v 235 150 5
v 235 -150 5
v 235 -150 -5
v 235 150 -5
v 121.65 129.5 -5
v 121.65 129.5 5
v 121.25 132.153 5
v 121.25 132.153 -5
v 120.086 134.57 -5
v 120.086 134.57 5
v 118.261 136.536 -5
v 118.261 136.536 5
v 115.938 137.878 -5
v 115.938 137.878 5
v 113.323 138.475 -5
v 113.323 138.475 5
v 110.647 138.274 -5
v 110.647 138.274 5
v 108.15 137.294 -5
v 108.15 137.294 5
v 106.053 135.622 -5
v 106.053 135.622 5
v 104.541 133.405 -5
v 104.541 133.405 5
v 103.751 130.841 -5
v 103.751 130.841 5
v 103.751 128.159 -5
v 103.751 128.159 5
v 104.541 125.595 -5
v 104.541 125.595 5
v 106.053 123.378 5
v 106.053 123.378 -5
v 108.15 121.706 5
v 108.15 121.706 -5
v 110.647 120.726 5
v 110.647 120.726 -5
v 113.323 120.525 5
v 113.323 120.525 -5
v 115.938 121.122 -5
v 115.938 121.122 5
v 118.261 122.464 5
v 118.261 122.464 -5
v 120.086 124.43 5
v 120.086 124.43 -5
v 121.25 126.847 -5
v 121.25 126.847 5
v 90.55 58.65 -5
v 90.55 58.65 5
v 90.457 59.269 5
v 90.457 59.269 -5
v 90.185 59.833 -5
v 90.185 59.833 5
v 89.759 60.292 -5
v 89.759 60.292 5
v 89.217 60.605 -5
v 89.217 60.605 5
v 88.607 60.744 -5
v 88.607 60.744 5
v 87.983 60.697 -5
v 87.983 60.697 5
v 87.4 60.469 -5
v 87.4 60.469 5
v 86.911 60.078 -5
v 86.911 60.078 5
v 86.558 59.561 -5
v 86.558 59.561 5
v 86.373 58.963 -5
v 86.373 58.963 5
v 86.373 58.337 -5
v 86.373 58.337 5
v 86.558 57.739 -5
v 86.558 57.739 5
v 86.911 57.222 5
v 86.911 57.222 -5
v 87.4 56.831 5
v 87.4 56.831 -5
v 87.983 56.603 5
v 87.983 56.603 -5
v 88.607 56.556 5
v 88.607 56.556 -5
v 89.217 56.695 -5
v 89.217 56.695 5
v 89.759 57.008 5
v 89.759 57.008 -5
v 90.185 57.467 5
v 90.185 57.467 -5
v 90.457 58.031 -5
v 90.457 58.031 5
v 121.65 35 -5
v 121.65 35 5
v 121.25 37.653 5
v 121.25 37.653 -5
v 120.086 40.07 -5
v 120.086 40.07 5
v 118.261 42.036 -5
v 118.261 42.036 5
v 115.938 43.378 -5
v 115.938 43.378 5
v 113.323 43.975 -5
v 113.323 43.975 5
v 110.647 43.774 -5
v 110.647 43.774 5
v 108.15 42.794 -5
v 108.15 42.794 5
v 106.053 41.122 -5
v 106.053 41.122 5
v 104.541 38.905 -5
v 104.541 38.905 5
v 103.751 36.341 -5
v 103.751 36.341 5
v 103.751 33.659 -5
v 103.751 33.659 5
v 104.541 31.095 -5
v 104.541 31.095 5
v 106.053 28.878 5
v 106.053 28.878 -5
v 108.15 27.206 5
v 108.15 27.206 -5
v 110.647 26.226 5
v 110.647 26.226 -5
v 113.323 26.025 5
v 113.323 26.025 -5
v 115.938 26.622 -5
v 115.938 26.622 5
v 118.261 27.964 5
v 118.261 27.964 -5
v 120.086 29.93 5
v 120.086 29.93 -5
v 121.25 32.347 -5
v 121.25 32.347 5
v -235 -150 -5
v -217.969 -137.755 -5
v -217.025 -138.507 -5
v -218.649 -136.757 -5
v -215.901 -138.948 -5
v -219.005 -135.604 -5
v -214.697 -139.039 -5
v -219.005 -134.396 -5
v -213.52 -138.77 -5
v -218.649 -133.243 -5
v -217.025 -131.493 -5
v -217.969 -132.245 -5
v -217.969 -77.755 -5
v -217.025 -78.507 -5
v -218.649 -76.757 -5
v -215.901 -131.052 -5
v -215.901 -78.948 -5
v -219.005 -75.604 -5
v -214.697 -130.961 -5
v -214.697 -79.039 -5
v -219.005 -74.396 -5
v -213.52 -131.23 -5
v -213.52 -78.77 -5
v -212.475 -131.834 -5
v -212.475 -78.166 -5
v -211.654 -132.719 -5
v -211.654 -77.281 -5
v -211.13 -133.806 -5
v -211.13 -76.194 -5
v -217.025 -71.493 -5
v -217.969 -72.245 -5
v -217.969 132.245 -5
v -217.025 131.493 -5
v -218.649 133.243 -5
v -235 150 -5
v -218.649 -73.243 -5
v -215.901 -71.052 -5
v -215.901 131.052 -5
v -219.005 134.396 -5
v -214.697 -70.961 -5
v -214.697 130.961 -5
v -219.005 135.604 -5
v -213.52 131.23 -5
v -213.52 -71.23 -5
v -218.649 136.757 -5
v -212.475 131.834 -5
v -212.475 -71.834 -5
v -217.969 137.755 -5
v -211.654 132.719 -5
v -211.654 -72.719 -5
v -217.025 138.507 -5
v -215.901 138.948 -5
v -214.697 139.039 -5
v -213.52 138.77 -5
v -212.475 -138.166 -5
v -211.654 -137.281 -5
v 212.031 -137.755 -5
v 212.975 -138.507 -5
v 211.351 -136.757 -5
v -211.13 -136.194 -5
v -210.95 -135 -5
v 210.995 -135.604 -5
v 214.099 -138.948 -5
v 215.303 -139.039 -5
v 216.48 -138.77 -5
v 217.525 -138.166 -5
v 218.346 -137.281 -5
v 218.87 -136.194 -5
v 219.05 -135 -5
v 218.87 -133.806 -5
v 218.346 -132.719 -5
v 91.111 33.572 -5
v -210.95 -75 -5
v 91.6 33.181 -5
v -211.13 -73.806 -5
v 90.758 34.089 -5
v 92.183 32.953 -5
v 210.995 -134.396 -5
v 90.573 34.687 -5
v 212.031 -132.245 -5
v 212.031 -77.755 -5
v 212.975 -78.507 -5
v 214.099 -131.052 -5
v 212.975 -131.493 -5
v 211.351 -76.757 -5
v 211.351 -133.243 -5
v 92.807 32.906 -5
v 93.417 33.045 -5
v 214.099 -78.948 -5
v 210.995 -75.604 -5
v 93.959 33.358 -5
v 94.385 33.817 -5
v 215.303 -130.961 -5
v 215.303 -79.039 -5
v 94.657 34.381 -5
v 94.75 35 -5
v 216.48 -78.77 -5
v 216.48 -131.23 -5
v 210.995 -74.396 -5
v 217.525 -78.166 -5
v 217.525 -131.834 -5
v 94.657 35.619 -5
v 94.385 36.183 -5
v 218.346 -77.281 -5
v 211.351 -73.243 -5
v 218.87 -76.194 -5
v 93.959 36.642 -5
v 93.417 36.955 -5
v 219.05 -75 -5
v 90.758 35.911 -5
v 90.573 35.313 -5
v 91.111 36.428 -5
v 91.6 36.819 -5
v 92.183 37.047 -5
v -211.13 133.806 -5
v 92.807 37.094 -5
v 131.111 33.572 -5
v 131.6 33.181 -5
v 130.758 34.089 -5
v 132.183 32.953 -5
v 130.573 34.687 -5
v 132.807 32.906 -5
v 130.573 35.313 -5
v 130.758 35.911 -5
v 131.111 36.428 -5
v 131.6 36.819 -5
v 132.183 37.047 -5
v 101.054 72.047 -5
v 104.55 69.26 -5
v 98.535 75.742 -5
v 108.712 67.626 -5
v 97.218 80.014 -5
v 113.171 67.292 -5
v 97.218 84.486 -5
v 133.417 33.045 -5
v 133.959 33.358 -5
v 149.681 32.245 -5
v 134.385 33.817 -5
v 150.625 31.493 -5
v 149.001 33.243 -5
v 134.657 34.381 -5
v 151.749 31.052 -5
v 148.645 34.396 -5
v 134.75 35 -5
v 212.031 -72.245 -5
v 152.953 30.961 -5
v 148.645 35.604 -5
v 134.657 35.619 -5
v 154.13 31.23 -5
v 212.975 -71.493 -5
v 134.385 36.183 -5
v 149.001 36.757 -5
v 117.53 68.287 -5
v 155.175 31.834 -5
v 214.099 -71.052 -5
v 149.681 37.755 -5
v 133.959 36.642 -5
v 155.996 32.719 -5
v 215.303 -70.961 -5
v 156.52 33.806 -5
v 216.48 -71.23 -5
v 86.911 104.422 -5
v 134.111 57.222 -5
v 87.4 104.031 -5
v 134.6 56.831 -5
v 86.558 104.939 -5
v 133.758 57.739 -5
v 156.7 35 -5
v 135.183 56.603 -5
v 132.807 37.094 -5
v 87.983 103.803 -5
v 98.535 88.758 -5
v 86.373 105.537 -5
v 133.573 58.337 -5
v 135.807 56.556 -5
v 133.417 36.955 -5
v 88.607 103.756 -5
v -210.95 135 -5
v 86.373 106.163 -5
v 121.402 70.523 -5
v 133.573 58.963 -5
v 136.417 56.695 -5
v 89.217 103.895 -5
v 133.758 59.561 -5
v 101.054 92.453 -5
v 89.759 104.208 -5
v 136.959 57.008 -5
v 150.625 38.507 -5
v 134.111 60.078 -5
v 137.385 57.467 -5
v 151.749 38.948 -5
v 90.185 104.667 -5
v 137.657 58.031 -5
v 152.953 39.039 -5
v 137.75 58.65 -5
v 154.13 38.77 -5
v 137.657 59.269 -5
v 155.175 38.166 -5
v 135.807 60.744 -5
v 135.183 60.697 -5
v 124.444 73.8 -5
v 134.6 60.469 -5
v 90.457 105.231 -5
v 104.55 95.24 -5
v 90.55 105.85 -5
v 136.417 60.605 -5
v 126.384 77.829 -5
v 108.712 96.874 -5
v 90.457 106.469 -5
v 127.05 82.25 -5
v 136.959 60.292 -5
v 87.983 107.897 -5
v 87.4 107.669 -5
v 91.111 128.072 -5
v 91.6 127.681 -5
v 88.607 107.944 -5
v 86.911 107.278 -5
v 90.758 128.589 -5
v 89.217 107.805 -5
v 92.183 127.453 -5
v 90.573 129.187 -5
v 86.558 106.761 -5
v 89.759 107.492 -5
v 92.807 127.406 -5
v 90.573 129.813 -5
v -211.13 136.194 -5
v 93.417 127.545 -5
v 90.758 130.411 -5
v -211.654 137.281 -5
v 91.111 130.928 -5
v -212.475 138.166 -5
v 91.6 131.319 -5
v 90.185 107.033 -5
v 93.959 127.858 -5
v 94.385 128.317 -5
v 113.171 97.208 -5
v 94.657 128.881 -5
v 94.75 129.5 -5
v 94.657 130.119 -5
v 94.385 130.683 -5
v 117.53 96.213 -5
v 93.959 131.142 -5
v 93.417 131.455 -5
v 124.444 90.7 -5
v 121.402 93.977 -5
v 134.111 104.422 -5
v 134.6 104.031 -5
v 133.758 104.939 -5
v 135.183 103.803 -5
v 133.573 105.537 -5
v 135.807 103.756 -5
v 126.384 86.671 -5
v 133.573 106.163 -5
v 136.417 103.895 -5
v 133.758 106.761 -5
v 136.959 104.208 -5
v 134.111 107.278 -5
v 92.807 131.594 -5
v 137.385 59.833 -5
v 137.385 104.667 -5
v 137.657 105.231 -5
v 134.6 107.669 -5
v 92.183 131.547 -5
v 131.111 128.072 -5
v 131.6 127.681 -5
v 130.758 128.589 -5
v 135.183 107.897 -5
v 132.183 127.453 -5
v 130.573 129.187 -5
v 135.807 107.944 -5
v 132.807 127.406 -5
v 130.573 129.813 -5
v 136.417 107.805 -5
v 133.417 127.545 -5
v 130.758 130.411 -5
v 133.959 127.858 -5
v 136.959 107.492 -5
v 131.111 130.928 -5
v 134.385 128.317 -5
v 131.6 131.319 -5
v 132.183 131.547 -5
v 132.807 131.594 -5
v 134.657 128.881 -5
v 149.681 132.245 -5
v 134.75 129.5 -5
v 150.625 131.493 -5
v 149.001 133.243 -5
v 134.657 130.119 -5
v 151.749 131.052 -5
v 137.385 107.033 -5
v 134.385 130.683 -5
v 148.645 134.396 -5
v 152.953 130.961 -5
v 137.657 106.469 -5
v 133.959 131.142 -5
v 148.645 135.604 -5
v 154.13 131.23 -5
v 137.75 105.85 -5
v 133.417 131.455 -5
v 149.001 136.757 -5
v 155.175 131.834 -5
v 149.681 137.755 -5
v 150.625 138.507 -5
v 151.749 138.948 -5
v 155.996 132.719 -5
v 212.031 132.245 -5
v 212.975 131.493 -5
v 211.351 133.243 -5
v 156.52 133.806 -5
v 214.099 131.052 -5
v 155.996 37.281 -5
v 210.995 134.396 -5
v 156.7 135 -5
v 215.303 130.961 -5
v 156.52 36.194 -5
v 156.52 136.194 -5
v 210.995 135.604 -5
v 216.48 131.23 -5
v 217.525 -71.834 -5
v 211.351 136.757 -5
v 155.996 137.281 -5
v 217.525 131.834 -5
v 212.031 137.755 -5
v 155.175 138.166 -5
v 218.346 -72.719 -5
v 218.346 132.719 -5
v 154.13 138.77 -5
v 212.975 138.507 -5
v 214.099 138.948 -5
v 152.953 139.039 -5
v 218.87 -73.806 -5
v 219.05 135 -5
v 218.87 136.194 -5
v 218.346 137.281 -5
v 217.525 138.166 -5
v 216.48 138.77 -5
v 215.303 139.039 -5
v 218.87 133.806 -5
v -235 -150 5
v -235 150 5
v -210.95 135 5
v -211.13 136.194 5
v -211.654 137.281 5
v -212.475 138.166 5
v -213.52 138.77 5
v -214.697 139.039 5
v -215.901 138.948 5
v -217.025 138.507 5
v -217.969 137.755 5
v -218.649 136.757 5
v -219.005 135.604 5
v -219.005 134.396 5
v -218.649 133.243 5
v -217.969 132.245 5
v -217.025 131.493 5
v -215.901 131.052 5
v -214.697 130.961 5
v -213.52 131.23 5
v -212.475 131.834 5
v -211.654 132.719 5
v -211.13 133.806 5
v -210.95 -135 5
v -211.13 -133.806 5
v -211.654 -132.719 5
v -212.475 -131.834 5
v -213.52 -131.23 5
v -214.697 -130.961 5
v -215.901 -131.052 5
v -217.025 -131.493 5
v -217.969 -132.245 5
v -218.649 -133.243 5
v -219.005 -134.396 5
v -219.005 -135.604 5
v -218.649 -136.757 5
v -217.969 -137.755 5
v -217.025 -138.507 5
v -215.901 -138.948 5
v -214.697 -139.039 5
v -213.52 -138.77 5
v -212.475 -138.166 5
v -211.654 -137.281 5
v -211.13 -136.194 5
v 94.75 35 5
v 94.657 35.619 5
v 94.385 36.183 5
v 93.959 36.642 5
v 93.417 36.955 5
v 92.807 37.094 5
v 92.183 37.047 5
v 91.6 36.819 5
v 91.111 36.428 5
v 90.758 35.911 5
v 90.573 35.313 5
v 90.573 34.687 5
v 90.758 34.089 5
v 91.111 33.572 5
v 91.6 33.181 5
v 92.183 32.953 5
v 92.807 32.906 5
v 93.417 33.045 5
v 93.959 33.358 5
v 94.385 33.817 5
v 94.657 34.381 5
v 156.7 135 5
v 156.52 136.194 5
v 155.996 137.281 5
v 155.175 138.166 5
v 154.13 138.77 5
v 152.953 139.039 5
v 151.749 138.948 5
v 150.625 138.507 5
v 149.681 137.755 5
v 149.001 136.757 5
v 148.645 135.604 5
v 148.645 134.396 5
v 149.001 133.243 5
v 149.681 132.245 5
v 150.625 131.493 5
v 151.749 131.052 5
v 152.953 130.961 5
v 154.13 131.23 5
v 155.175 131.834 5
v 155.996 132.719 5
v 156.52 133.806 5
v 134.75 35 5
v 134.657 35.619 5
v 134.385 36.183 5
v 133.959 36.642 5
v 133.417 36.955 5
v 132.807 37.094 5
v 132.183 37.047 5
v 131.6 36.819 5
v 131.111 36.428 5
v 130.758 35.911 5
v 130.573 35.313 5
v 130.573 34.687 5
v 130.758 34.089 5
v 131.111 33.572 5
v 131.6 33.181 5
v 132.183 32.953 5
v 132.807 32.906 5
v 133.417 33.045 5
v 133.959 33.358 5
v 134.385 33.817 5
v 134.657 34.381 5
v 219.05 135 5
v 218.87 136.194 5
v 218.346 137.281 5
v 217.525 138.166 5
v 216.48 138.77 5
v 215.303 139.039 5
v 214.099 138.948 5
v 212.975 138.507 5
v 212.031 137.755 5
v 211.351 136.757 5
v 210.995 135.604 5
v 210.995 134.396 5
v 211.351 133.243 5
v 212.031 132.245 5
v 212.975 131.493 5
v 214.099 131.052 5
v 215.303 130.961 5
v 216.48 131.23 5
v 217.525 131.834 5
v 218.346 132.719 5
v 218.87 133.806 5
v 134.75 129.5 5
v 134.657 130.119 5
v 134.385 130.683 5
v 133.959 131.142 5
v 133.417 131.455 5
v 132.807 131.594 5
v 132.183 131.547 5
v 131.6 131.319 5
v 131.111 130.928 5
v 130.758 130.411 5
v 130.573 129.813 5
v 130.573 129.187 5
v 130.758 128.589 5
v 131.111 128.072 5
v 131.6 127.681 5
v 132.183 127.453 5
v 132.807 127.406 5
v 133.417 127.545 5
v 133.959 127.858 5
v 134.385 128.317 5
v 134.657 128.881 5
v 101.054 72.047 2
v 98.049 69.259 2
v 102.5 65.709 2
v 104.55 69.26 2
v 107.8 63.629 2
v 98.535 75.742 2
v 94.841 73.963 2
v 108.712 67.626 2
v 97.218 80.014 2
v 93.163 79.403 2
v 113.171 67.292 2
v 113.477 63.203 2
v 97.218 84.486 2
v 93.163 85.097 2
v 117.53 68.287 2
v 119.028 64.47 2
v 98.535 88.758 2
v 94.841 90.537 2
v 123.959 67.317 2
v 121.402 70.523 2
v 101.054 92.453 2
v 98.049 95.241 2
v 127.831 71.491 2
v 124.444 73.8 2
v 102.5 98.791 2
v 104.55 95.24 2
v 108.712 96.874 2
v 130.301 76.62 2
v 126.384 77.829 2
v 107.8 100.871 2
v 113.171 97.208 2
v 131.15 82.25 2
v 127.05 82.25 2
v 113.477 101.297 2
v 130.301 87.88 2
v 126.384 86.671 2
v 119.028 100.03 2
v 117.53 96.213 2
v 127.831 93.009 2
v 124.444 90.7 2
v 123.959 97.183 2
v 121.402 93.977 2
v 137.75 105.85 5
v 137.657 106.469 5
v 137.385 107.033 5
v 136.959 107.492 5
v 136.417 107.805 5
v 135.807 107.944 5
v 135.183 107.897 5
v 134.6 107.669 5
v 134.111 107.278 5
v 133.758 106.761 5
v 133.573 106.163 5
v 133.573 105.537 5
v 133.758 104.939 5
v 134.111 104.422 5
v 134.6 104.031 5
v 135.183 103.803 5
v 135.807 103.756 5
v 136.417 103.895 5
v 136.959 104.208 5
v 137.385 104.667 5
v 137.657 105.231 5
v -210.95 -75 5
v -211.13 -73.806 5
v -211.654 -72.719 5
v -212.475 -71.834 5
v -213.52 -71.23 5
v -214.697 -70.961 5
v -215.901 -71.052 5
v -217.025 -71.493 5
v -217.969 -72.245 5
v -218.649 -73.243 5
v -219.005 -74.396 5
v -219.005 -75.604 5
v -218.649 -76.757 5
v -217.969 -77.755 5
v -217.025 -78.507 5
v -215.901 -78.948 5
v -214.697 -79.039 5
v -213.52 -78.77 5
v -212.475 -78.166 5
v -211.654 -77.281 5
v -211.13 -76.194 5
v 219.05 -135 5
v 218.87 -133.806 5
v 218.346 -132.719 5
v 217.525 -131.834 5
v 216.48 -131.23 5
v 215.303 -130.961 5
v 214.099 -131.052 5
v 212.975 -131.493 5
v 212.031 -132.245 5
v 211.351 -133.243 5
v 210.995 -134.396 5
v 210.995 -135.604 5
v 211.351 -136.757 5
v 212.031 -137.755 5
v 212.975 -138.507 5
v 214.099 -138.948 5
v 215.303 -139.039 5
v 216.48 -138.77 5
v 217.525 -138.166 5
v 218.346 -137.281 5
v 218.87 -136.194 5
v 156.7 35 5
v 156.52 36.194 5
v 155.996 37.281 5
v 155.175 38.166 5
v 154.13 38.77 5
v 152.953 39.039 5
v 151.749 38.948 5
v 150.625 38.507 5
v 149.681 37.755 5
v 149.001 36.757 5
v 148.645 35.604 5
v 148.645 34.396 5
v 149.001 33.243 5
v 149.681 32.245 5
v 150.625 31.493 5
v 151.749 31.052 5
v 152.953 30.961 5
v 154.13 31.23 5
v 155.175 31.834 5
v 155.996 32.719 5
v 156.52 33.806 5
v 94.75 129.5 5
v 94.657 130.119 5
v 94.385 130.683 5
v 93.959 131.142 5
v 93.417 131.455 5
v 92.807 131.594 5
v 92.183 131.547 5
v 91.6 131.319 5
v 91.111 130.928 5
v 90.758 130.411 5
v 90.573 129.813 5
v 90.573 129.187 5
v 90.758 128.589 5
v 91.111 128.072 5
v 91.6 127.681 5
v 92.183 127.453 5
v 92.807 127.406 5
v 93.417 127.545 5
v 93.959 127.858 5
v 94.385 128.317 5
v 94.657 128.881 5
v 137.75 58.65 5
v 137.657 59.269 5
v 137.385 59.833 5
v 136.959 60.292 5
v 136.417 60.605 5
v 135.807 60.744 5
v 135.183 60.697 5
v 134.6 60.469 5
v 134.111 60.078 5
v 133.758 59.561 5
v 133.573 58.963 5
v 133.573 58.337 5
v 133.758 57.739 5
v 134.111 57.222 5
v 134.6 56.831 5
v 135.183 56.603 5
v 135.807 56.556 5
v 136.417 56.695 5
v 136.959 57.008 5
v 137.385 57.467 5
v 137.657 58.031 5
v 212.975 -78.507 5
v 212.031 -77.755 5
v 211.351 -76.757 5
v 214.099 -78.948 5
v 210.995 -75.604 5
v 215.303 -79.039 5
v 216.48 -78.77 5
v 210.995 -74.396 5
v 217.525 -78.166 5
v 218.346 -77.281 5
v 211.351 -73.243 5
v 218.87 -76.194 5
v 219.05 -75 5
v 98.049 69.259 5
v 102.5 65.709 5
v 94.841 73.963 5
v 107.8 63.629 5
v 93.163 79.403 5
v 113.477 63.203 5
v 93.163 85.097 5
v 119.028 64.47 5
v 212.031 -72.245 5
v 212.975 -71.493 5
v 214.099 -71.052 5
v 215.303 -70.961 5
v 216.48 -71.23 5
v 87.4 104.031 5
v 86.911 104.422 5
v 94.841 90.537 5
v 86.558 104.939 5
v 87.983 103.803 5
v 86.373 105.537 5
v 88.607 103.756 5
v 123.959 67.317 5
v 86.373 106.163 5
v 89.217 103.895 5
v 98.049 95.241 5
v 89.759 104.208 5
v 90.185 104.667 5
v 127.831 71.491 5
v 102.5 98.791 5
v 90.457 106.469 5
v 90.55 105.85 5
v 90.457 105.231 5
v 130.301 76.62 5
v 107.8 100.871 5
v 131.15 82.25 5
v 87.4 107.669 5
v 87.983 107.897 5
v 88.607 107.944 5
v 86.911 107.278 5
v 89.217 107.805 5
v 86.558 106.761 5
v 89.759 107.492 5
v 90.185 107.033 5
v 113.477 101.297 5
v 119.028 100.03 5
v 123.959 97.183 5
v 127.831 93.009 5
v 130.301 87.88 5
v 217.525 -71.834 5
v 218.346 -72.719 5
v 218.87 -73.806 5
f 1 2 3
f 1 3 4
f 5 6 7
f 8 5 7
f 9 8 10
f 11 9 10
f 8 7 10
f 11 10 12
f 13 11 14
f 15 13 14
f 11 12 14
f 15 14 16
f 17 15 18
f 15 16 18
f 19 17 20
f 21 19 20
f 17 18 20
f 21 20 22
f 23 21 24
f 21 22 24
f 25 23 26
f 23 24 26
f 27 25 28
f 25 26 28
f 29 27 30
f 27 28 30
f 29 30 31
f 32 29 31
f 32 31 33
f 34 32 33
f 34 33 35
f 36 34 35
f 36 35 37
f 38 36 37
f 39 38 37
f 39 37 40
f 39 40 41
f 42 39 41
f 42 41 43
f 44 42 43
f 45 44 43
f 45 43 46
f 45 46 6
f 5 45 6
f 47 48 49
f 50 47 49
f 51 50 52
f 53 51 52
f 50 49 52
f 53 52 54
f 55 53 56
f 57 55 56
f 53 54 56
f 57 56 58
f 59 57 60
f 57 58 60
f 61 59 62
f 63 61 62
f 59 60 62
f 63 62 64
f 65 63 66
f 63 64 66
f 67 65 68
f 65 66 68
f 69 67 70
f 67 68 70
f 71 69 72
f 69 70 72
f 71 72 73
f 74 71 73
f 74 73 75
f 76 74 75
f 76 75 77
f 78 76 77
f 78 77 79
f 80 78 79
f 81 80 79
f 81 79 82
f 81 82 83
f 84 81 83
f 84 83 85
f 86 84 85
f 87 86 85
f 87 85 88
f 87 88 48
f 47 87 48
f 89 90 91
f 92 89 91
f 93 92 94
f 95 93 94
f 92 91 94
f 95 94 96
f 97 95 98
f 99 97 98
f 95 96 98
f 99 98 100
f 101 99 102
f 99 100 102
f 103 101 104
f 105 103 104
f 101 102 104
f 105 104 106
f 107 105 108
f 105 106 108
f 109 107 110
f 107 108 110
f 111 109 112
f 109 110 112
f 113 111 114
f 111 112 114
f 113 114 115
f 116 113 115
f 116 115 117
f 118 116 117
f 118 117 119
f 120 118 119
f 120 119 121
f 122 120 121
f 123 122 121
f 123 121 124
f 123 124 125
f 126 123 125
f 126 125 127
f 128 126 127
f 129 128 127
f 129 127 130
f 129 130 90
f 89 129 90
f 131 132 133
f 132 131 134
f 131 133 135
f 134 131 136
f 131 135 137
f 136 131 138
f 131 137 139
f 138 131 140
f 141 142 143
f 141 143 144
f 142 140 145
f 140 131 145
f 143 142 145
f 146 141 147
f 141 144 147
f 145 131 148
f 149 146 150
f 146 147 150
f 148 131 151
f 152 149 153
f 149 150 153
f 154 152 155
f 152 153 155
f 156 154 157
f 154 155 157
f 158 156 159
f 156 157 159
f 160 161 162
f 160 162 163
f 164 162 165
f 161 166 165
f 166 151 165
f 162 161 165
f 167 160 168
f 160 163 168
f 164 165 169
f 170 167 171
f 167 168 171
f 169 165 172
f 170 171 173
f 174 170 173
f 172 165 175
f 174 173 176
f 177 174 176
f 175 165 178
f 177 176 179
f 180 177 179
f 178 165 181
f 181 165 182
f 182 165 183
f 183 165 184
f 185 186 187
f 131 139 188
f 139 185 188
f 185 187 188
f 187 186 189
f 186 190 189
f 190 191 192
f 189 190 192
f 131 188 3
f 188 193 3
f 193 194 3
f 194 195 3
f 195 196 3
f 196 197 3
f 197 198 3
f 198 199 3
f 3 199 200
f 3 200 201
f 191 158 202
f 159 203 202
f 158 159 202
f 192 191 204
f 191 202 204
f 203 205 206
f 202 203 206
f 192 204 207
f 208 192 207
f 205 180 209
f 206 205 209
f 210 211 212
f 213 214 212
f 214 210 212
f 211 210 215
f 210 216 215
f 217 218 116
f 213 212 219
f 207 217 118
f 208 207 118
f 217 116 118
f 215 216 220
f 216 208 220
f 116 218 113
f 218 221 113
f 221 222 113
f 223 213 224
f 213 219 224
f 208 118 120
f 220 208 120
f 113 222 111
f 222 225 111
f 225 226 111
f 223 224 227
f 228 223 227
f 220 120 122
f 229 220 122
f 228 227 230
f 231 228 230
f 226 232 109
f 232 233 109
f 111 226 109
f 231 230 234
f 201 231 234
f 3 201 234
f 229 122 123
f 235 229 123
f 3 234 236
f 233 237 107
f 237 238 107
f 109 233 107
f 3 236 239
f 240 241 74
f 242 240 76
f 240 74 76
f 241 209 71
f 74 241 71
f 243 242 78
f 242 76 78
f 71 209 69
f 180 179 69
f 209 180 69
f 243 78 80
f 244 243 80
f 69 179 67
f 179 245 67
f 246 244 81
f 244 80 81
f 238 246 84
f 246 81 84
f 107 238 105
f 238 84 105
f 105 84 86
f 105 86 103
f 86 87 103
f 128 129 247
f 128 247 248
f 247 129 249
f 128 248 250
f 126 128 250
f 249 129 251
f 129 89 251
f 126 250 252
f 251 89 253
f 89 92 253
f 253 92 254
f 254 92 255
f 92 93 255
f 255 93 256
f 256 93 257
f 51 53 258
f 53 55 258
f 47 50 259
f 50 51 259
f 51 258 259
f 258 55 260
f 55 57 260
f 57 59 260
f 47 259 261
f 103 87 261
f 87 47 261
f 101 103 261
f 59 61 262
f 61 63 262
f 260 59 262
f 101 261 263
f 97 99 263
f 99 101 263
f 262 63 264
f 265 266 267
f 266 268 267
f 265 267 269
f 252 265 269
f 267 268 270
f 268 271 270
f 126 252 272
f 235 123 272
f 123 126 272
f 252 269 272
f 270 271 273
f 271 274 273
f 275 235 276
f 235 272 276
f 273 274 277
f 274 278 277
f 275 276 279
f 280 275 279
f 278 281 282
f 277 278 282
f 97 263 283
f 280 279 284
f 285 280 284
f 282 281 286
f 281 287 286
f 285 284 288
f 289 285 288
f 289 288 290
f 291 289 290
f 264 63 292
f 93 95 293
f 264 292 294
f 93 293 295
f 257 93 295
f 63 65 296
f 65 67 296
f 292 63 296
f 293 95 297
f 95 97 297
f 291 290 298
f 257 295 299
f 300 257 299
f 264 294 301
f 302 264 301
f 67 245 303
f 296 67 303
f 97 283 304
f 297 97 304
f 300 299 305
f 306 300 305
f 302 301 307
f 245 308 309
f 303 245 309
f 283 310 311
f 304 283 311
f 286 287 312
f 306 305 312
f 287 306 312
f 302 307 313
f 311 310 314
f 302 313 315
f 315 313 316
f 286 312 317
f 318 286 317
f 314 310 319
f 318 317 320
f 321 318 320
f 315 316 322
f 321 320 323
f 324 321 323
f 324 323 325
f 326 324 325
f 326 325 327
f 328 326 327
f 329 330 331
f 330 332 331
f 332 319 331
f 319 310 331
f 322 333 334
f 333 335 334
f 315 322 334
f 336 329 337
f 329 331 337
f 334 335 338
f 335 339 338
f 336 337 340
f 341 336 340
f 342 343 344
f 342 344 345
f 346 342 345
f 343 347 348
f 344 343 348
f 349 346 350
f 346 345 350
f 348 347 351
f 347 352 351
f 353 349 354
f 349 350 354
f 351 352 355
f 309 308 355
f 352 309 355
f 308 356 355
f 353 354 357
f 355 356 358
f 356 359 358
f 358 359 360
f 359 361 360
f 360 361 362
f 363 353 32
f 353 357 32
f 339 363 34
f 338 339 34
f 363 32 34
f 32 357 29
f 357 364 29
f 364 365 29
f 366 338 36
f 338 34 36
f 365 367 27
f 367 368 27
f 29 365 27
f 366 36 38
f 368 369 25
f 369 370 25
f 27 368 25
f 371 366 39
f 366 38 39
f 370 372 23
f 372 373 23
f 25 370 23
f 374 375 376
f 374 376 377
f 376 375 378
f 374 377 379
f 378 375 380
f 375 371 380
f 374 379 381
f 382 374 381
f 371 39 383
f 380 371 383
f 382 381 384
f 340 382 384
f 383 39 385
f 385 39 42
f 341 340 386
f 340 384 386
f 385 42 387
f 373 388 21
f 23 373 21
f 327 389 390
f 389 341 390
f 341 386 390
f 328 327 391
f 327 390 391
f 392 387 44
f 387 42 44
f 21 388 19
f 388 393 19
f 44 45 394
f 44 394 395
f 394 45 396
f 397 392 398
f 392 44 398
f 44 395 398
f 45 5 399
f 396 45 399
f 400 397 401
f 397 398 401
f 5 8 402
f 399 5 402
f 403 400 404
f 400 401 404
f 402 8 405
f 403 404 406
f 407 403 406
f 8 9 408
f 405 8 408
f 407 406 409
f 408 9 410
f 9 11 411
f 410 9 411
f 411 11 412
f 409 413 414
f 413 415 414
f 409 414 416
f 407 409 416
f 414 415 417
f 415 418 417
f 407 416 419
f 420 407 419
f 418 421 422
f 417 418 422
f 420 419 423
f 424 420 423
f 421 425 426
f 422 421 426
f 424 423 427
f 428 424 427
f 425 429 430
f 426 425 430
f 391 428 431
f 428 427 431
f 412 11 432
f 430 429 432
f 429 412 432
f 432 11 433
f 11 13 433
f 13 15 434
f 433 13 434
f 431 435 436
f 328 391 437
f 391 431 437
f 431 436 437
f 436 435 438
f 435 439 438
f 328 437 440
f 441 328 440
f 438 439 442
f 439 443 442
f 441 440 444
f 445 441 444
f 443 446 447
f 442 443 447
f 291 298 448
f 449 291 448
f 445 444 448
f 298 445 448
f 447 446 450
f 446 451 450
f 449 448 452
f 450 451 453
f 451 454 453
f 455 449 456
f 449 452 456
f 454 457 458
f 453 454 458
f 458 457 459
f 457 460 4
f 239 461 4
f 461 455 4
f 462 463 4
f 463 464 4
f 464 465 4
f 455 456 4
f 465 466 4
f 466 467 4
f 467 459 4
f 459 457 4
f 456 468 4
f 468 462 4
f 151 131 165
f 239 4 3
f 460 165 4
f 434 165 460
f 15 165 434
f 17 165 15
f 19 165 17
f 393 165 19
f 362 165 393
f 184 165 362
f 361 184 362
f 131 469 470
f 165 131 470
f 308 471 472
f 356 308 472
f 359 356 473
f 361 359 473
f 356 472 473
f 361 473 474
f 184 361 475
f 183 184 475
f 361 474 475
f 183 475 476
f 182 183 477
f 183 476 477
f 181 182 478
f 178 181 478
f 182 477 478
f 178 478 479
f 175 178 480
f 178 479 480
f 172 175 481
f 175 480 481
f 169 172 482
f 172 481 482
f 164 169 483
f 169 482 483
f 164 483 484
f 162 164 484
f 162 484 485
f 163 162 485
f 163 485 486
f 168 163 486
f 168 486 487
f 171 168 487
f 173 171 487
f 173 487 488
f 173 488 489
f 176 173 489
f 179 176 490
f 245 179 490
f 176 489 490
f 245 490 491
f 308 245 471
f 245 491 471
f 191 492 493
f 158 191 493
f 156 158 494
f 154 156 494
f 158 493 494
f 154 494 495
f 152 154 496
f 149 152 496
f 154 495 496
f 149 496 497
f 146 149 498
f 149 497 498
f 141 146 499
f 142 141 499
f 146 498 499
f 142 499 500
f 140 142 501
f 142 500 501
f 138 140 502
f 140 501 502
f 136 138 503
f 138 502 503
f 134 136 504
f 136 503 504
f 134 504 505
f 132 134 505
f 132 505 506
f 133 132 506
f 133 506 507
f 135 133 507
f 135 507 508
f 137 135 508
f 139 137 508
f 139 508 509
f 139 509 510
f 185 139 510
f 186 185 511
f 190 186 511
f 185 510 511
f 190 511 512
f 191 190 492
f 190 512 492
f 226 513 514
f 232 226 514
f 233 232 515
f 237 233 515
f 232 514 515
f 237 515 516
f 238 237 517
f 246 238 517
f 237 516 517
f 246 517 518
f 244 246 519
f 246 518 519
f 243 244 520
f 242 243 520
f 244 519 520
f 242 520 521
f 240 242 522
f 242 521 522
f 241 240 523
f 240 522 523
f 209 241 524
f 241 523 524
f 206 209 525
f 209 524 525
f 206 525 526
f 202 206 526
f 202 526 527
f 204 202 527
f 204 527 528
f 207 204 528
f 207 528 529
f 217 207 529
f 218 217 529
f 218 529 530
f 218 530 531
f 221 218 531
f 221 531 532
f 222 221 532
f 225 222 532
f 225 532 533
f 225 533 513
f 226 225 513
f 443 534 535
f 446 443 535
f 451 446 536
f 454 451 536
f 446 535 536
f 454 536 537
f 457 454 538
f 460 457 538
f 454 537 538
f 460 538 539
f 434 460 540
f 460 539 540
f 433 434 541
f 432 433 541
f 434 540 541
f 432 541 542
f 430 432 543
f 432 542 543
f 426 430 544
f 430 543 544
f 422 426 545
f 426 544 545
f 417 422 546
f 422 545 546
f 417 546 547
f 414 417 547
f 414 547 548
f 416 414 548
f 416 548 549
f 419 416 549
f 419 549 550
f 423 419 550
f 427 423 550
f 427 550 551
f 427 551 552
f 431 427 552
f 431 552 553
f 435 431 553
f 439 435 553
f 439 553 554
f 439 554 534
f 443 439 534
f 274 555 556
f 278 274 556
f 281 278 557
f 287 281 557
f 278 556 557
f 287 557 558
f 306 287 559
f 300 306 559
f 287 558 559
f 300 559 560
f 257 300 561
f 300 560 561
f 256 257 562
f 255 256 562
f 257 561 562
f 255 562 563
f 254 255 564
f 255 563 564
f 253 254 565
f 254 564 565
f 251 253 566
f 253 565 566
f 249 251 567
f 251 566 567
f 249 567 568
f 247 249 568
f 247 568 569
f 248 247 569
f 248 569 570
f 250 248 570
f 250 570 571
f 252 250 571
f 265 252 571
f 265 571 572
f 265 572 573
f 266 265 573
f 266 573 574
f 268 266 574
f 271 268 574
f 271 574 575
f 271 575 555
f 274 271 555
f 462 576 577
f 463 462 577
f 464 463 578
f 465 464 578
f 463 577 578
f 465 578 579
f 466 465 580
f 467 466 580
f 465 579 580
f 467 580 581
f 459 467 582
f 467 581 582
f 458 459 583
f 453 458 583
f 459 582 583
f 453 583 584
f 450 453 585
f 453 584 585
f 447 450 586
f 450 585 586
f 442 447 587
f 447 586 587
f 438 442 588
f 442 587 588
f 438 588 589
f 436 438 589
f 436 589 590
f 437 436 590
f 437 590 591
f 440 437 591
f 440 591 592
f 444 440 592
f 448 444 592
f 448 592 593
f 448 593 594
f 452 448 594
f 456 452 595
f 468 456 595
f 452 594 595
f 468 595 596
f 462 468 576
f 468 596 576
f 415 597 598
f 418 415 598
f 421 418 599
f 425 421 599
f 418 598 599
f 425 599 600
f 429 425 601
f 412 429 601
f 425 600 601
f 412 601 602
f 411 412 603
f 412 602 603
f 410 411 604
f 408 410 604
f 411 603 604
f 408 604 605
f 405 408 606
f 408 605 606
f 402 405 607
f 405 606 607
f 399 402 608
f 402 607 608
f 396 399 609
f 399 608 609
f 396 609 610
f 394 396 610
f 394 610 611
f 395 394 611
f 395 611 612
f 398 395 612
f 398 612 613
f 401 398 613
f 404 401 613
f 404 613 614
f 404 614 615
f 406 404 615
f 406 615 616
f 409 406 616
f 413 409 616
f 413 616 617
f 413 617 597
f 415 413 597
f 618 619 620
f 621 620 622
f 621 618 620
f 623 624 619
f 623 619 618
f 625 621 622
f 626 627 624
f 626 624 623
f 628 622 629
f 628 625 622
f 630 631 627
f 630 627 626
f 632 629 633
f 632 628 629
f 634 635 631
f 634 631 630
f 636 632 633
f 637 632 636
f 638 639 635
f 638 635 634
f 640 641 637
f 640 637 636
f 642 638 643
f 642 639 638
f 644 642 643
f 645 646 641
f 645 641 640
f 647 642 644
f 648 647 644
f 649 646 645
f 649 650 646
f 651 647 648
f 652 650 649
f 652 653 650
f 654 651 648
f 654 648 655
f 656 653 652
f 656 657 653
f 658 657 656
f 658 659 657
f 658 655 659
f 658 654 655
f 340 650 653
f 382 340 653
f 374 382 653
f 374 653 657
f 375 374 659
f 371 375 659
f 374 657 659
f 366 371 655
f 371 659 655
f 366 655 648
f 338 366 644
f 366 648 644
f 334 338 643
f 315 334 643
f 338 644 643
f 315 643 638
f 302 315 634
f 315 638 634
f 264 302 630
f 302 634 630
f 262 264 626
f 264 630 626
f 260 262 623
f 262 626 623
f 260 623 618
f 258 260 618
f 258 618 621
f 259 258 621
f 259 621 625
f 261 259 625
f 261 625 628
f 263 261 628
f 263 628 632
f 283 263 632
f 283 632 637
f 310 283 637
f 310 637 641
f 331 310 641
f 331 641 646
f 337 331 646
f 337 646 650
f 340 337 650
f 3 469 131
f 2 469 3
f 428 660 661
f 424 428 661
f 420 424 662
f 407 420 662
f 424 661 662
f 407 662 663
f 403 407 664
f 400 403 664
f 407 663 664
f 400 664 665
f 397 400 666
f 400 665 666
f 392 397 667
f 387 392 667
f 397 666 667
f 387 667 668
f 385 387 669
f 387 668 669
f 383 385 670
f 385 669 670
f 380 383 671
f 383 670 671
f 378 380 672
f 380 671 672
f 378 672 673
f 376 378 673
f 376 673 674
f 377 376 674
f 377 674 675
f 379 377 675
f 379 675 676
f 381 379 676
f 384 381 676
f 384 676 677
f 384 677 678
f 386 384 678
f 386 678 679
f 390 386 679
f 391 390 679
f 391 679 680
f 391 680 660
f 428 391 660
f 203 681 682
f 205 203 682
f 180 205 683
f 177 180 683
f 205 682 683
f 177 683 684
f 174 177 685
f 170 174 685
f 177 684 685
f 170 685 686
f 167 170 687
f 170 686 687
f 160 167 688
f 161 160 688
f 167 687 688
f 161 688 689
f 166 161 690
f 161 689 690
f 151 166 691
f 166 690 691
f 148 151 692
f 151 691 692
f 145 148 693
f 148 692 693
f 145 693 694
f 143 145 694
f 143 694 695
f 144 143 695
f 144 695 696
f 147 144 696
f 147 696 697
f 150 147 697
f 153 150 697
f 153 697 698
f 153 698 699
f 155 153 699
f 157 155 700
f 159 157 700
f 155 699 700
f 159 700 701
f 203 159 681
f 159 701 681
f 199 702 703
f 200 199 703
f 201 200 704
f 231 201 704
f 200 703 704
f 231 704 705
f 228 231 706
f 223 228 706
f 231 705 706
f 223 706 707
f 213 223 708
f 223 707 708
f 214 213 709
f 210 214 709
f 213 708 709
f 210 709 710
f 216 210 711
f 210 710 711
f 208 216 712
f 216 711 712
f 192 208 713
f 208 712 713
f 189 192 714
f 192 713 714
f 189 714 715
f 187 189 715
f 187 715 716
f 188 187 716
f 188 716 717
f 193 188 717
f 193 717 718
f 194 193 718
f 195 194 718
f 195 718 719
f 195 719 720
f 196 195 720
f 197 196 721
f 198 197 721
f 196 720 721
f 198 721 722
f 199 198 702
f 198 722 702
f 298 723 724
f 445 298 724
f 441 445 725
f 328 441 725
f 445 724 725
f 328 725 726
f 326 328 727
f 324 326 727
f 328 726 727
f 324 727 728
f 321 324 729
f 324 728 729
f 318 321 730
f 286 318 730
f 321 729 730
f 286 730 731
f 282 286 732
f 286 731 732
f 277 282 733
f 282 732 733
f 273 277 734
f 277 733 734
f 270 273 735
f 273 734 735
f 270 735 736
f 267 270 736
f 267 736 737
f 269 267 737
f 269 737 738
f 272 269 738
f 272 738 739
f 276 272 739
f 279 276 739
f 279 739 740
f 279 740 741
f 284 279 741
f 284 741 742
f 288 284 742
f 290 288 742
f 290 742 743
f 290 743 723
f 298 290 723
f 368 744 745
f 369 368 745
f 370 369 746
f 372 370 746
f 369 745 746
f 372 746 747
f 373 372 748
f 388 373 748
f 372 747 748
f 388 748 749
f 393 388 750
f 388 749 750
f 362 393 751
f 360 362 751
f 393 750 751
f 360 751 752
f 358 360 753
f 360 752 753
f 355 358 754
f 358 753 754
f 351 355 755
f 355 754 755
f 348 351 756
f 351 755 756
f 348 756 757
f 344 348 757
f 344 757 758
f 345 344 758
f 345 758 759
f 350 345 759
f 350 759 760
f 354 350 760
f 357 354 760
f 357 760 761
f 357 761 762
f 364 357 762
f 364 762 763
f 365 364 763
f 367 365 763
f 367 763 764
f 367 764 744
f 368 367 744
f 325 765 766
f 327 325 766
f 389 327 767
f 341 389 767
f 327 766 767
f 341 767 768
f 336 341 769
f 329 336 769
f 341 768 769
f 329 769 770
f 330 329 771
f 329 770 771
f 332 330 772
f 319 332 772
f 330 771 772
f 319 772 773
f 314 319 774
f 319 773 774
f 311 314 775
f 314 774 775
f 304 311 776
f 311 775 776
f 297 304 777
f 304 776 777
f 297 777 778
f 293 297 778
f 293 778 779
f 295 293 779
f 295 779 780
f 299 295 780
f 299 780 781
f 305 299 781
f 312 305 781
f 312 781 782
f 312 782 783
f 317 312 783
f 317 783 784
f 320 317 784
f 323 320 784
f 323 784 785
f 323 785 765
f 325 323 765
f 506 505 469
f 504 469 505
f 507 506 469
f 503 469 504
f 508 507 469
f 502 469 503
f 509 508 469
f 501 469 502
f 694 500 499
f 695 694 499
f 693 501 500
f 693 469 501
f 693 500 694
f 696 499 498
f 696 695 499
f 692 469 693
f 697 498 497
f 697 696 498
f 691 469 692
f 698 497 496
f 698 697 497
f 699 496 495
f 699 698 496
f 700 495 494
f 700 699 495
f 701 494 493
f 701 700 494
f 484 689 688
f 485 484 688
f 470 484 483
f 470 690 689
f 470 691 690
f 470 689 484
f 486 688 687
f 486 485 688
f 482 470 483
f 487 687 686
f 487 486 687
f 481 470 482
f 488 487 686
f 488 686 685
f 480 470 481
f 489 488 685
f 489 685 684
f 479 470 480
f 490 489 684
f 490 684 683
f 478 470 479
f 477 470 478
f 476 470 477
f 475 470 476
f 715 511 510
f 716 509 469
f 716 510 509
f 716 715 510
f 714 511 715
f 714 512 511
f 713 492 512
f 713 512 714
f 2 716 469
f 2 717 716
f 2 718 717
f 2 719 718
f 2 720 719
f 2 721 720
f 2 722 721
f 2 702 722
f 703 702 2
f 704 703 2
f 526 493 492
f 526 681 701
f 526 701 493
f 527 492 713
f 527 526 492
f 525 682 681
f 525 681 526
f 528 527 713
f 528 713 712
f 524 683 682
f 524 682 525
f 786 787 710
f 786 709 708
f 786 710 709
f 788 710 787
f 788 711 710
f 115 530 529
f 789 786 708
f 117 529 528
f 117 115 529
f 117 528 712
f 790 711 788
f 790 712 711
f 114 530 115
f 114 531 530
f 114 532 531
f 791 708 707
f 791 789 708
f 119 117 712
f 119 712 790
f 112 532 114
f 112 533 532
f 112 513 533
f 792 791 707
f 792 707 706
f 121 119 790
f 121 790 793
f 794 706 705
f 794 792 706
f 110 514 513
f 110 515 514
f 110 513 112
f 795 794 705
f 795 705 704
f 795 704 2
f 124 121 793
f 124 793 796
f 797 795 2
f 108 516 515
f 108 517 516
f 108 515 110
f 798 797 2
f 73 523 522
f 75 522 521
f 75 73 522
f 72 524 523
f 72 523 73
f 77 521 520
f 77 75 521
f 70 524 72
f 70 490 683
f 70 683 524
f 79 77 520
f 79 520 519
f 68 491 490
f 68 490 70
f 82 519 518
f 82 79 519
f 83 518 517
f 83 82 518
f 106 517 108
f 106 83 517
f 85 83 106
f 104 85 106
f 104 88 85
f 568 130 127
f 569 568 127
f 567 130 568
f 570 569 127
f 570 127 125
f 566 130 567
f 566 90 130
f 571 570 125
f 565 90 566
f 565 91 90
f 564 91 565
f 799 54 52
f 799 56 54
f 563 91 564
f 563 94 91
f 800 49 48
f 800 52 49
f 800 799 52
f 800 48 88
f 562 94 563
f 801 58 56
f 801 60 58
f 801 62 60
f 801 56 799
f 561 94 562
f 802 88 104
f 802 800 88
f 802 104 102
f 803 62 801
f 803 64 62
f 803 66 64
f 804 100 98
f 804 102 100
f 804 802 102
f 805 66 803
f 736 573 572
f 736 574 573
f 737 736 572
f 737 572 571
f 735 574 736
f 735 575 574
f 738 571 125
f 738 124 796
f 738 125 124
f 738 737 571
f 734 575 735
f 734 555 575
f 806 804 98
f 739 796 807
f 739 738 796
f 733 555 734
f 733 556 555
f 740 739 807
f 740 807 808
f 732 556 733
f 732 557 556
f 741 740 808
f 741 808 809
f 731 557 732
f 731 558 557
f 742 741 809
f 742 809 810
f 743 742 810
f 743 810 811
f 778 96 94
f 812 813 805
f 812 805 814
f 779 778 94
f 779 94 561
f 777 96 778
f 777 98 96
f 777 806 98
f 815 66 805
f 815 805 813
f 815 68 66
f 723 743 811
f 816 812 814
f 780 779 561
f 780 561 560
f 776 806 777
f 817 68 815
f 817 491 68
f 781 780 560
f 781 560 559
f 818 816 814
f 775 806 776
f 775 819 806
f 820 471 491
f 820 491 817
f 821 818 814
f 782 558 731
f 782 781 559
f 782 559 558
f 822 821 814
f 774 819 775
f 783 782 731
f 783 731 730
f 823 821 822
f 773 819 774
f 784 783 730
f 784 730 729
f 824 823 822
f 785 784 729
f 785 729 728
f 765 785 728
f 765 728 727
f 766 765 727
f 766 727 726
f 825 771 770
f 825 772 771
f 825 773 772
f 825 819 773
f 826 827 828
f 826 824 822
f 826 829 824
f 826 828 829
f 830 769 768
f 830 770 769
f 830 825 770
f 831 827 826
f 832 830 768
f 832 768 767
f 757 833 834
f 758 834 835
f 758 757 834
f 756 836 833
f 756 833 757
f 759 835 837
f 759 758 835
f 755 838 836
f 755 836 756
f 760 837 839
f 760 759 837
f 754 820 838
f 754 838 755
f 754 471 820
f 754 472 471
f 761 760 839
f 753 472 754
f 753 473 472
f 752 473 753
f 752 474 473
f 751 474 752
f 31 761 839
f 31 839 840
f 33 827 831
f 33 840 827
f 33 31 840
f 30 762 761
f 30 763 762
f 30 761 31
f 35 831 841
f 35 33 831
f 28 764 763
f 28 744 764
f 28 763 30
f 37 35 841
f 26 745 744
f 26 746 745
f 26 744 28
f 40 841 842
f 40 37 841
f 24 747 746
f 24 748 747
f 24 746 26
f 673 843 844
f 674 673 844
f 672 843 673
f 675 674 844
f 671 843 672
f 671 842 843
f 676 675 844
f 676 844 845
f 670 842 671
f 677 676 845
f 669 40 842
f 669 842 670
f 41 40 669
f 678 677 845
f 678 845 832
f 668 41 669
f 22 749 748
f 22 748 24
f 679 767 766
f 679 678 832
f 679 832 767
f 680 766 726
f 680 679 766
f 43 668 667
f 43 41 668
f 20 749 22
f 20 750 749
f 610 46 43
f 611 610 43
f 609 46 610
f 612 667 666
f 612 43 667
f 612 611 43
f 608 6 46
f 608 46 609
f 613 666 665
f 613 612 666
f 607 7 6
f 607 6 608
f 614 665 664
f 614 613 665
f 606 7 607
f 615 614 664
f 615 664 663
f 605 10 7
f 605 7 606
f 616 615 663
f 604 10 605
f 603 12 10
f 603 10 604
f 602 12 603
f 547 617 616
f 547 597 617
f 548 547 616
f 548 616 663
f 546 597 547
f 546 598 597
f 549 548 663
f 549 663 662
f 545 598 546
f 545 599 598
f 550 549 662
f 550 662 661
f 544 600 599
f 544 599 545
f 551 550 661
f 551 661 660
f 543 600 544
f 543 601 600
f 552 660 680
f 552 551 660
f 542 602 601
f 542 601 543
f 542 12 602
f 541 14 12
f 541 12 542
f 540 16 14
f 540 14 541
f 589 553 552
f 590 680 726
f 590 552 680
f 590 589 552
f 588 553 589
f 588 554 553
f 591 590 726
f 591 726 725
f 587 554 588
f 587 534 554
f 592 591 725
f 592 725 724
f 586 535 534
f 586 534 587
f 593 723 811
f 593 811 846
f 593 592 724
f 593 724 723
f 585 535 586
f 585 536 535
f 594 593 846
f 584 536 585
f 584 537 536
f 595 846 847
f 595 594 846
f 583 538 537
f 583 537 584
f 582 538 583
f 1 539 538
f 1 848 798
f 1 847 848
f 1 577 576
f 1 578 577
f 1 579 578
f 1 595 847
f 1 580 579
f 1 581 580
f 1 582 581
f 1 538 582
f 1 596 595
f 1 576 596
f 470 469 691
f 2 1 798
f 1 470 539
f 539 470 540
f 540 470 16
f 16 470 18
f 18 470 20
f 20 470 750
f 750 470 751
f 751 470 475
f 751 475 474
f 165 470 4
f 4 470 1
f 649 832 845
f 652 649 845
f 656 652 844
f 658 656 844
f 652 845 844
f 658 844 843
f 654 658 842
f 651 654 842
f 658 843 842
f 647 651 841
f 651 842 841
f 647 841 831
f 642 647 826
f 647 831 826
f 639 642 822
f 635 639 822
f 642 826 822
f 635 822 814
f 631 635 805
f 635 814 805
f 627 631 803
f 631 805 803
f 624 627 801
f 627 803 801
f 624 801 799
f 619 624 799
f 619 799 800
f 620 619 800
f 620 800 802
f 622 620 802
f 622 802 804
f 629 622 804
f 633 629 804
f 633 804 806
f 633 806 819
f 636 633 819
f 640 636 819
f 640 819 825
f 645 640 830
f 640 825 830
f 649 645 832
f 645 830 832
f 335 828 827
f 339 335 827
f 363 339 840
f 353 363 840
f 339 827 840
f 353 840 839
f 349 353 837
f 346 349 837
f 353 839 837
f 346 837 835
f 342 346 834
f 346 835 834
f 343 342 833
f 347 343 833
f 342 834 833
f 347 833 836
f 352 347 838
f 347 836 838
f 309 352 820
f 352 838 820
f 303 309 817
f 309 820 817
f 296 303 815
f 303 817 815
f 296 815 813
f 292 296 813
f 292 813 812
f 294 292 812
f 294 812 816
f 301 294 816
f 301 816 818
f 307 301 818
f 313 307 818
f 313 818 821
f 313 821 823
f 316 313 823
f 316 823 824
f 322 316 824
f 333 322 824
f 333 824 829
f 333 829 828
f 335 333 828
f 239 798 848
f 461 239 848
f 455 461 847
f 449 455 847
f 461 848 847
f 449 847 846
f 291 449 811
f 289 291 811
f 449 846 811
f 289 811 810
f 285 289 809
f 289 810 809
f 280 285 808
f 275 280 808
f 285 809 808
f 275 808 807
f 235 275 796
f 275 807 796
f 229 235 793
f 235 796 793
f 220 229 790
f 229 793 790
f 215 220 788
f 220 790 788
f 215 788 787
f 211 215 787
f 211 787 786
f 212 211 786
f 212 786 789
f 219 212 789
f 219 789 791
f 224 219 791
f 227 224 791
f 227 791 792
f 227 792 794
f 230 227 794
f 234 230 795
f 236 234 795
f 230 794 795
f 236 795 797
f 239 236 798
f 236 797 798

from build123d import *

# Parameters (mm, degrees)
SKETCH2_W           = 470
SKETCH2_H           = 300
BOSS_EXTRUDE1_DEPTH = 5
SKETCH3_R           = 4.05
CUT_EXTRUDE1_DEPTH  = 10
SKETCH4_R           = 9
SKETCH4_R_2         = 2.1
CUT_EXTRUDE2_DEPTH  = 11
SKETCH5_R           = 4.05
CUT_EXTRUDE3_DEPTH  = 11
SKETCH7_R           = 19.1
CUT_EXTRUDE5_DEPTH  = 3
SKETCH8_R           = 15
CUT_EXTRUDE6_DEPTH  = 8
SKETCH9_R           = 2.1
CUT_EXTRUDE7_DEPTH  = 11


with BuildPart() as part:
    # Sketch2 → Boss-Extrude1 (new body, symmetric)
    with BuildSketch(Plane.XY):
        Rectangle(SKETCH2_W, SKETCH2_H)
    extrude(amount=BOSS_EXTRUDE1_DEPTH, both=True)

    # Sketch3 → Cut-Extrude1 (cut)
    with BuildSketch(Plane.XY.offset(5)):
        with Locations((-215, -75)):
            Circle(SKETCH3_R)
        with Locations((-215, -135)):
            Circle(SKETCH3_R)
        with Locations((215, -75)):
            Circle(SKETCH3_R)
        with Locations((215, -135)):
            Circle(SKETCH3_R)
        with Locations((-215, 135)):
            Circle(SKETCH3_R)
        with Locations((215, 135)):
            Circle(SKETCH3_R)
    extrude(amount=-CUT_EXTRUDE1_DEPTH, mode=Mode.SUBTRACT)

    # Sketch4 → Cut-Extrude2 (cut, through all)
    with BuildSketch(Plane.XY.offset(5)):
        with Locations((112.65, 129.5)):
            Circle(SKETCH4_R)
        with Locations((112.65, 35)):
            Circle(SKETCH4_R)
        with Locations((92.65, 129.5)):
            Circle(SKETCH4_R_2)
        with Locations((132.65, 129.5)):
            Circle(SKETCH4_R_2)
        with Locations((132.65, 35)):
            Circle(SKETCH4_R_2)
        with Locations((92.65, 35)):
            Circle(SKETCH4_R_2)
    extrude(amount=-CUT_EXTRUDE2_DEPTH, mode=Mode.SUBTRACT)

    # Sketch5 → Cut-Extrude3 (cut, through all)
    with BuildSketch(Plane.XY.offset(5)):
        with Locations((152.65, 135)):
            Circle(SKETCH5_R)
        with Locations((152.65, 35)):
            Circle(SKETCH5_R)
    extrude(amount=-CUT_EXTRUDE3_DEPTH, mode=Mode.SUBTRACT)

    # Sketch7 → Cut-Extrude5 (cut)
    with BuildSketch(Plane.XY.offset(5)):
        with Locations((112.05, 82.25)):
            Circle(SKETCH7_R)
    extrude(amount=-CUT_EXTRUDE5_DEPTH, mode=Mode.SUBTRACT)

    # Sketch8 → Cut-Extrude6 (cut, through all)
    with BuildSketch(Plane.XY.offset(2)):
        with Locations((112.05, 82.25)):
            Circle(SKETCH8_R)
    extrude(amount=-CUT_EXTRUDE6_DEPTH, mode=Mode.SUBTRACT)

    # Sketch9 → Cut-Extrude7 (cut, through all)
    with BuildSketch(Plane.XY.offset(5)):
        with Locations((88.45, 105.85)):
            Circle(SKETCH9_R)
        with Locations((135.65, 105.85)):
            Circle(SKETCH9_R)
        with Locations((135.65, 58.65)):
            Circle(SKETCH9_R)
        with Locations((88.45, 58.65)):
            Circle(SKETCH9_R)
    extrude(amount=-CUT_EXTRUDE7_DEPTH, mode=Mode.SUBTRACT)


solid = part.part
